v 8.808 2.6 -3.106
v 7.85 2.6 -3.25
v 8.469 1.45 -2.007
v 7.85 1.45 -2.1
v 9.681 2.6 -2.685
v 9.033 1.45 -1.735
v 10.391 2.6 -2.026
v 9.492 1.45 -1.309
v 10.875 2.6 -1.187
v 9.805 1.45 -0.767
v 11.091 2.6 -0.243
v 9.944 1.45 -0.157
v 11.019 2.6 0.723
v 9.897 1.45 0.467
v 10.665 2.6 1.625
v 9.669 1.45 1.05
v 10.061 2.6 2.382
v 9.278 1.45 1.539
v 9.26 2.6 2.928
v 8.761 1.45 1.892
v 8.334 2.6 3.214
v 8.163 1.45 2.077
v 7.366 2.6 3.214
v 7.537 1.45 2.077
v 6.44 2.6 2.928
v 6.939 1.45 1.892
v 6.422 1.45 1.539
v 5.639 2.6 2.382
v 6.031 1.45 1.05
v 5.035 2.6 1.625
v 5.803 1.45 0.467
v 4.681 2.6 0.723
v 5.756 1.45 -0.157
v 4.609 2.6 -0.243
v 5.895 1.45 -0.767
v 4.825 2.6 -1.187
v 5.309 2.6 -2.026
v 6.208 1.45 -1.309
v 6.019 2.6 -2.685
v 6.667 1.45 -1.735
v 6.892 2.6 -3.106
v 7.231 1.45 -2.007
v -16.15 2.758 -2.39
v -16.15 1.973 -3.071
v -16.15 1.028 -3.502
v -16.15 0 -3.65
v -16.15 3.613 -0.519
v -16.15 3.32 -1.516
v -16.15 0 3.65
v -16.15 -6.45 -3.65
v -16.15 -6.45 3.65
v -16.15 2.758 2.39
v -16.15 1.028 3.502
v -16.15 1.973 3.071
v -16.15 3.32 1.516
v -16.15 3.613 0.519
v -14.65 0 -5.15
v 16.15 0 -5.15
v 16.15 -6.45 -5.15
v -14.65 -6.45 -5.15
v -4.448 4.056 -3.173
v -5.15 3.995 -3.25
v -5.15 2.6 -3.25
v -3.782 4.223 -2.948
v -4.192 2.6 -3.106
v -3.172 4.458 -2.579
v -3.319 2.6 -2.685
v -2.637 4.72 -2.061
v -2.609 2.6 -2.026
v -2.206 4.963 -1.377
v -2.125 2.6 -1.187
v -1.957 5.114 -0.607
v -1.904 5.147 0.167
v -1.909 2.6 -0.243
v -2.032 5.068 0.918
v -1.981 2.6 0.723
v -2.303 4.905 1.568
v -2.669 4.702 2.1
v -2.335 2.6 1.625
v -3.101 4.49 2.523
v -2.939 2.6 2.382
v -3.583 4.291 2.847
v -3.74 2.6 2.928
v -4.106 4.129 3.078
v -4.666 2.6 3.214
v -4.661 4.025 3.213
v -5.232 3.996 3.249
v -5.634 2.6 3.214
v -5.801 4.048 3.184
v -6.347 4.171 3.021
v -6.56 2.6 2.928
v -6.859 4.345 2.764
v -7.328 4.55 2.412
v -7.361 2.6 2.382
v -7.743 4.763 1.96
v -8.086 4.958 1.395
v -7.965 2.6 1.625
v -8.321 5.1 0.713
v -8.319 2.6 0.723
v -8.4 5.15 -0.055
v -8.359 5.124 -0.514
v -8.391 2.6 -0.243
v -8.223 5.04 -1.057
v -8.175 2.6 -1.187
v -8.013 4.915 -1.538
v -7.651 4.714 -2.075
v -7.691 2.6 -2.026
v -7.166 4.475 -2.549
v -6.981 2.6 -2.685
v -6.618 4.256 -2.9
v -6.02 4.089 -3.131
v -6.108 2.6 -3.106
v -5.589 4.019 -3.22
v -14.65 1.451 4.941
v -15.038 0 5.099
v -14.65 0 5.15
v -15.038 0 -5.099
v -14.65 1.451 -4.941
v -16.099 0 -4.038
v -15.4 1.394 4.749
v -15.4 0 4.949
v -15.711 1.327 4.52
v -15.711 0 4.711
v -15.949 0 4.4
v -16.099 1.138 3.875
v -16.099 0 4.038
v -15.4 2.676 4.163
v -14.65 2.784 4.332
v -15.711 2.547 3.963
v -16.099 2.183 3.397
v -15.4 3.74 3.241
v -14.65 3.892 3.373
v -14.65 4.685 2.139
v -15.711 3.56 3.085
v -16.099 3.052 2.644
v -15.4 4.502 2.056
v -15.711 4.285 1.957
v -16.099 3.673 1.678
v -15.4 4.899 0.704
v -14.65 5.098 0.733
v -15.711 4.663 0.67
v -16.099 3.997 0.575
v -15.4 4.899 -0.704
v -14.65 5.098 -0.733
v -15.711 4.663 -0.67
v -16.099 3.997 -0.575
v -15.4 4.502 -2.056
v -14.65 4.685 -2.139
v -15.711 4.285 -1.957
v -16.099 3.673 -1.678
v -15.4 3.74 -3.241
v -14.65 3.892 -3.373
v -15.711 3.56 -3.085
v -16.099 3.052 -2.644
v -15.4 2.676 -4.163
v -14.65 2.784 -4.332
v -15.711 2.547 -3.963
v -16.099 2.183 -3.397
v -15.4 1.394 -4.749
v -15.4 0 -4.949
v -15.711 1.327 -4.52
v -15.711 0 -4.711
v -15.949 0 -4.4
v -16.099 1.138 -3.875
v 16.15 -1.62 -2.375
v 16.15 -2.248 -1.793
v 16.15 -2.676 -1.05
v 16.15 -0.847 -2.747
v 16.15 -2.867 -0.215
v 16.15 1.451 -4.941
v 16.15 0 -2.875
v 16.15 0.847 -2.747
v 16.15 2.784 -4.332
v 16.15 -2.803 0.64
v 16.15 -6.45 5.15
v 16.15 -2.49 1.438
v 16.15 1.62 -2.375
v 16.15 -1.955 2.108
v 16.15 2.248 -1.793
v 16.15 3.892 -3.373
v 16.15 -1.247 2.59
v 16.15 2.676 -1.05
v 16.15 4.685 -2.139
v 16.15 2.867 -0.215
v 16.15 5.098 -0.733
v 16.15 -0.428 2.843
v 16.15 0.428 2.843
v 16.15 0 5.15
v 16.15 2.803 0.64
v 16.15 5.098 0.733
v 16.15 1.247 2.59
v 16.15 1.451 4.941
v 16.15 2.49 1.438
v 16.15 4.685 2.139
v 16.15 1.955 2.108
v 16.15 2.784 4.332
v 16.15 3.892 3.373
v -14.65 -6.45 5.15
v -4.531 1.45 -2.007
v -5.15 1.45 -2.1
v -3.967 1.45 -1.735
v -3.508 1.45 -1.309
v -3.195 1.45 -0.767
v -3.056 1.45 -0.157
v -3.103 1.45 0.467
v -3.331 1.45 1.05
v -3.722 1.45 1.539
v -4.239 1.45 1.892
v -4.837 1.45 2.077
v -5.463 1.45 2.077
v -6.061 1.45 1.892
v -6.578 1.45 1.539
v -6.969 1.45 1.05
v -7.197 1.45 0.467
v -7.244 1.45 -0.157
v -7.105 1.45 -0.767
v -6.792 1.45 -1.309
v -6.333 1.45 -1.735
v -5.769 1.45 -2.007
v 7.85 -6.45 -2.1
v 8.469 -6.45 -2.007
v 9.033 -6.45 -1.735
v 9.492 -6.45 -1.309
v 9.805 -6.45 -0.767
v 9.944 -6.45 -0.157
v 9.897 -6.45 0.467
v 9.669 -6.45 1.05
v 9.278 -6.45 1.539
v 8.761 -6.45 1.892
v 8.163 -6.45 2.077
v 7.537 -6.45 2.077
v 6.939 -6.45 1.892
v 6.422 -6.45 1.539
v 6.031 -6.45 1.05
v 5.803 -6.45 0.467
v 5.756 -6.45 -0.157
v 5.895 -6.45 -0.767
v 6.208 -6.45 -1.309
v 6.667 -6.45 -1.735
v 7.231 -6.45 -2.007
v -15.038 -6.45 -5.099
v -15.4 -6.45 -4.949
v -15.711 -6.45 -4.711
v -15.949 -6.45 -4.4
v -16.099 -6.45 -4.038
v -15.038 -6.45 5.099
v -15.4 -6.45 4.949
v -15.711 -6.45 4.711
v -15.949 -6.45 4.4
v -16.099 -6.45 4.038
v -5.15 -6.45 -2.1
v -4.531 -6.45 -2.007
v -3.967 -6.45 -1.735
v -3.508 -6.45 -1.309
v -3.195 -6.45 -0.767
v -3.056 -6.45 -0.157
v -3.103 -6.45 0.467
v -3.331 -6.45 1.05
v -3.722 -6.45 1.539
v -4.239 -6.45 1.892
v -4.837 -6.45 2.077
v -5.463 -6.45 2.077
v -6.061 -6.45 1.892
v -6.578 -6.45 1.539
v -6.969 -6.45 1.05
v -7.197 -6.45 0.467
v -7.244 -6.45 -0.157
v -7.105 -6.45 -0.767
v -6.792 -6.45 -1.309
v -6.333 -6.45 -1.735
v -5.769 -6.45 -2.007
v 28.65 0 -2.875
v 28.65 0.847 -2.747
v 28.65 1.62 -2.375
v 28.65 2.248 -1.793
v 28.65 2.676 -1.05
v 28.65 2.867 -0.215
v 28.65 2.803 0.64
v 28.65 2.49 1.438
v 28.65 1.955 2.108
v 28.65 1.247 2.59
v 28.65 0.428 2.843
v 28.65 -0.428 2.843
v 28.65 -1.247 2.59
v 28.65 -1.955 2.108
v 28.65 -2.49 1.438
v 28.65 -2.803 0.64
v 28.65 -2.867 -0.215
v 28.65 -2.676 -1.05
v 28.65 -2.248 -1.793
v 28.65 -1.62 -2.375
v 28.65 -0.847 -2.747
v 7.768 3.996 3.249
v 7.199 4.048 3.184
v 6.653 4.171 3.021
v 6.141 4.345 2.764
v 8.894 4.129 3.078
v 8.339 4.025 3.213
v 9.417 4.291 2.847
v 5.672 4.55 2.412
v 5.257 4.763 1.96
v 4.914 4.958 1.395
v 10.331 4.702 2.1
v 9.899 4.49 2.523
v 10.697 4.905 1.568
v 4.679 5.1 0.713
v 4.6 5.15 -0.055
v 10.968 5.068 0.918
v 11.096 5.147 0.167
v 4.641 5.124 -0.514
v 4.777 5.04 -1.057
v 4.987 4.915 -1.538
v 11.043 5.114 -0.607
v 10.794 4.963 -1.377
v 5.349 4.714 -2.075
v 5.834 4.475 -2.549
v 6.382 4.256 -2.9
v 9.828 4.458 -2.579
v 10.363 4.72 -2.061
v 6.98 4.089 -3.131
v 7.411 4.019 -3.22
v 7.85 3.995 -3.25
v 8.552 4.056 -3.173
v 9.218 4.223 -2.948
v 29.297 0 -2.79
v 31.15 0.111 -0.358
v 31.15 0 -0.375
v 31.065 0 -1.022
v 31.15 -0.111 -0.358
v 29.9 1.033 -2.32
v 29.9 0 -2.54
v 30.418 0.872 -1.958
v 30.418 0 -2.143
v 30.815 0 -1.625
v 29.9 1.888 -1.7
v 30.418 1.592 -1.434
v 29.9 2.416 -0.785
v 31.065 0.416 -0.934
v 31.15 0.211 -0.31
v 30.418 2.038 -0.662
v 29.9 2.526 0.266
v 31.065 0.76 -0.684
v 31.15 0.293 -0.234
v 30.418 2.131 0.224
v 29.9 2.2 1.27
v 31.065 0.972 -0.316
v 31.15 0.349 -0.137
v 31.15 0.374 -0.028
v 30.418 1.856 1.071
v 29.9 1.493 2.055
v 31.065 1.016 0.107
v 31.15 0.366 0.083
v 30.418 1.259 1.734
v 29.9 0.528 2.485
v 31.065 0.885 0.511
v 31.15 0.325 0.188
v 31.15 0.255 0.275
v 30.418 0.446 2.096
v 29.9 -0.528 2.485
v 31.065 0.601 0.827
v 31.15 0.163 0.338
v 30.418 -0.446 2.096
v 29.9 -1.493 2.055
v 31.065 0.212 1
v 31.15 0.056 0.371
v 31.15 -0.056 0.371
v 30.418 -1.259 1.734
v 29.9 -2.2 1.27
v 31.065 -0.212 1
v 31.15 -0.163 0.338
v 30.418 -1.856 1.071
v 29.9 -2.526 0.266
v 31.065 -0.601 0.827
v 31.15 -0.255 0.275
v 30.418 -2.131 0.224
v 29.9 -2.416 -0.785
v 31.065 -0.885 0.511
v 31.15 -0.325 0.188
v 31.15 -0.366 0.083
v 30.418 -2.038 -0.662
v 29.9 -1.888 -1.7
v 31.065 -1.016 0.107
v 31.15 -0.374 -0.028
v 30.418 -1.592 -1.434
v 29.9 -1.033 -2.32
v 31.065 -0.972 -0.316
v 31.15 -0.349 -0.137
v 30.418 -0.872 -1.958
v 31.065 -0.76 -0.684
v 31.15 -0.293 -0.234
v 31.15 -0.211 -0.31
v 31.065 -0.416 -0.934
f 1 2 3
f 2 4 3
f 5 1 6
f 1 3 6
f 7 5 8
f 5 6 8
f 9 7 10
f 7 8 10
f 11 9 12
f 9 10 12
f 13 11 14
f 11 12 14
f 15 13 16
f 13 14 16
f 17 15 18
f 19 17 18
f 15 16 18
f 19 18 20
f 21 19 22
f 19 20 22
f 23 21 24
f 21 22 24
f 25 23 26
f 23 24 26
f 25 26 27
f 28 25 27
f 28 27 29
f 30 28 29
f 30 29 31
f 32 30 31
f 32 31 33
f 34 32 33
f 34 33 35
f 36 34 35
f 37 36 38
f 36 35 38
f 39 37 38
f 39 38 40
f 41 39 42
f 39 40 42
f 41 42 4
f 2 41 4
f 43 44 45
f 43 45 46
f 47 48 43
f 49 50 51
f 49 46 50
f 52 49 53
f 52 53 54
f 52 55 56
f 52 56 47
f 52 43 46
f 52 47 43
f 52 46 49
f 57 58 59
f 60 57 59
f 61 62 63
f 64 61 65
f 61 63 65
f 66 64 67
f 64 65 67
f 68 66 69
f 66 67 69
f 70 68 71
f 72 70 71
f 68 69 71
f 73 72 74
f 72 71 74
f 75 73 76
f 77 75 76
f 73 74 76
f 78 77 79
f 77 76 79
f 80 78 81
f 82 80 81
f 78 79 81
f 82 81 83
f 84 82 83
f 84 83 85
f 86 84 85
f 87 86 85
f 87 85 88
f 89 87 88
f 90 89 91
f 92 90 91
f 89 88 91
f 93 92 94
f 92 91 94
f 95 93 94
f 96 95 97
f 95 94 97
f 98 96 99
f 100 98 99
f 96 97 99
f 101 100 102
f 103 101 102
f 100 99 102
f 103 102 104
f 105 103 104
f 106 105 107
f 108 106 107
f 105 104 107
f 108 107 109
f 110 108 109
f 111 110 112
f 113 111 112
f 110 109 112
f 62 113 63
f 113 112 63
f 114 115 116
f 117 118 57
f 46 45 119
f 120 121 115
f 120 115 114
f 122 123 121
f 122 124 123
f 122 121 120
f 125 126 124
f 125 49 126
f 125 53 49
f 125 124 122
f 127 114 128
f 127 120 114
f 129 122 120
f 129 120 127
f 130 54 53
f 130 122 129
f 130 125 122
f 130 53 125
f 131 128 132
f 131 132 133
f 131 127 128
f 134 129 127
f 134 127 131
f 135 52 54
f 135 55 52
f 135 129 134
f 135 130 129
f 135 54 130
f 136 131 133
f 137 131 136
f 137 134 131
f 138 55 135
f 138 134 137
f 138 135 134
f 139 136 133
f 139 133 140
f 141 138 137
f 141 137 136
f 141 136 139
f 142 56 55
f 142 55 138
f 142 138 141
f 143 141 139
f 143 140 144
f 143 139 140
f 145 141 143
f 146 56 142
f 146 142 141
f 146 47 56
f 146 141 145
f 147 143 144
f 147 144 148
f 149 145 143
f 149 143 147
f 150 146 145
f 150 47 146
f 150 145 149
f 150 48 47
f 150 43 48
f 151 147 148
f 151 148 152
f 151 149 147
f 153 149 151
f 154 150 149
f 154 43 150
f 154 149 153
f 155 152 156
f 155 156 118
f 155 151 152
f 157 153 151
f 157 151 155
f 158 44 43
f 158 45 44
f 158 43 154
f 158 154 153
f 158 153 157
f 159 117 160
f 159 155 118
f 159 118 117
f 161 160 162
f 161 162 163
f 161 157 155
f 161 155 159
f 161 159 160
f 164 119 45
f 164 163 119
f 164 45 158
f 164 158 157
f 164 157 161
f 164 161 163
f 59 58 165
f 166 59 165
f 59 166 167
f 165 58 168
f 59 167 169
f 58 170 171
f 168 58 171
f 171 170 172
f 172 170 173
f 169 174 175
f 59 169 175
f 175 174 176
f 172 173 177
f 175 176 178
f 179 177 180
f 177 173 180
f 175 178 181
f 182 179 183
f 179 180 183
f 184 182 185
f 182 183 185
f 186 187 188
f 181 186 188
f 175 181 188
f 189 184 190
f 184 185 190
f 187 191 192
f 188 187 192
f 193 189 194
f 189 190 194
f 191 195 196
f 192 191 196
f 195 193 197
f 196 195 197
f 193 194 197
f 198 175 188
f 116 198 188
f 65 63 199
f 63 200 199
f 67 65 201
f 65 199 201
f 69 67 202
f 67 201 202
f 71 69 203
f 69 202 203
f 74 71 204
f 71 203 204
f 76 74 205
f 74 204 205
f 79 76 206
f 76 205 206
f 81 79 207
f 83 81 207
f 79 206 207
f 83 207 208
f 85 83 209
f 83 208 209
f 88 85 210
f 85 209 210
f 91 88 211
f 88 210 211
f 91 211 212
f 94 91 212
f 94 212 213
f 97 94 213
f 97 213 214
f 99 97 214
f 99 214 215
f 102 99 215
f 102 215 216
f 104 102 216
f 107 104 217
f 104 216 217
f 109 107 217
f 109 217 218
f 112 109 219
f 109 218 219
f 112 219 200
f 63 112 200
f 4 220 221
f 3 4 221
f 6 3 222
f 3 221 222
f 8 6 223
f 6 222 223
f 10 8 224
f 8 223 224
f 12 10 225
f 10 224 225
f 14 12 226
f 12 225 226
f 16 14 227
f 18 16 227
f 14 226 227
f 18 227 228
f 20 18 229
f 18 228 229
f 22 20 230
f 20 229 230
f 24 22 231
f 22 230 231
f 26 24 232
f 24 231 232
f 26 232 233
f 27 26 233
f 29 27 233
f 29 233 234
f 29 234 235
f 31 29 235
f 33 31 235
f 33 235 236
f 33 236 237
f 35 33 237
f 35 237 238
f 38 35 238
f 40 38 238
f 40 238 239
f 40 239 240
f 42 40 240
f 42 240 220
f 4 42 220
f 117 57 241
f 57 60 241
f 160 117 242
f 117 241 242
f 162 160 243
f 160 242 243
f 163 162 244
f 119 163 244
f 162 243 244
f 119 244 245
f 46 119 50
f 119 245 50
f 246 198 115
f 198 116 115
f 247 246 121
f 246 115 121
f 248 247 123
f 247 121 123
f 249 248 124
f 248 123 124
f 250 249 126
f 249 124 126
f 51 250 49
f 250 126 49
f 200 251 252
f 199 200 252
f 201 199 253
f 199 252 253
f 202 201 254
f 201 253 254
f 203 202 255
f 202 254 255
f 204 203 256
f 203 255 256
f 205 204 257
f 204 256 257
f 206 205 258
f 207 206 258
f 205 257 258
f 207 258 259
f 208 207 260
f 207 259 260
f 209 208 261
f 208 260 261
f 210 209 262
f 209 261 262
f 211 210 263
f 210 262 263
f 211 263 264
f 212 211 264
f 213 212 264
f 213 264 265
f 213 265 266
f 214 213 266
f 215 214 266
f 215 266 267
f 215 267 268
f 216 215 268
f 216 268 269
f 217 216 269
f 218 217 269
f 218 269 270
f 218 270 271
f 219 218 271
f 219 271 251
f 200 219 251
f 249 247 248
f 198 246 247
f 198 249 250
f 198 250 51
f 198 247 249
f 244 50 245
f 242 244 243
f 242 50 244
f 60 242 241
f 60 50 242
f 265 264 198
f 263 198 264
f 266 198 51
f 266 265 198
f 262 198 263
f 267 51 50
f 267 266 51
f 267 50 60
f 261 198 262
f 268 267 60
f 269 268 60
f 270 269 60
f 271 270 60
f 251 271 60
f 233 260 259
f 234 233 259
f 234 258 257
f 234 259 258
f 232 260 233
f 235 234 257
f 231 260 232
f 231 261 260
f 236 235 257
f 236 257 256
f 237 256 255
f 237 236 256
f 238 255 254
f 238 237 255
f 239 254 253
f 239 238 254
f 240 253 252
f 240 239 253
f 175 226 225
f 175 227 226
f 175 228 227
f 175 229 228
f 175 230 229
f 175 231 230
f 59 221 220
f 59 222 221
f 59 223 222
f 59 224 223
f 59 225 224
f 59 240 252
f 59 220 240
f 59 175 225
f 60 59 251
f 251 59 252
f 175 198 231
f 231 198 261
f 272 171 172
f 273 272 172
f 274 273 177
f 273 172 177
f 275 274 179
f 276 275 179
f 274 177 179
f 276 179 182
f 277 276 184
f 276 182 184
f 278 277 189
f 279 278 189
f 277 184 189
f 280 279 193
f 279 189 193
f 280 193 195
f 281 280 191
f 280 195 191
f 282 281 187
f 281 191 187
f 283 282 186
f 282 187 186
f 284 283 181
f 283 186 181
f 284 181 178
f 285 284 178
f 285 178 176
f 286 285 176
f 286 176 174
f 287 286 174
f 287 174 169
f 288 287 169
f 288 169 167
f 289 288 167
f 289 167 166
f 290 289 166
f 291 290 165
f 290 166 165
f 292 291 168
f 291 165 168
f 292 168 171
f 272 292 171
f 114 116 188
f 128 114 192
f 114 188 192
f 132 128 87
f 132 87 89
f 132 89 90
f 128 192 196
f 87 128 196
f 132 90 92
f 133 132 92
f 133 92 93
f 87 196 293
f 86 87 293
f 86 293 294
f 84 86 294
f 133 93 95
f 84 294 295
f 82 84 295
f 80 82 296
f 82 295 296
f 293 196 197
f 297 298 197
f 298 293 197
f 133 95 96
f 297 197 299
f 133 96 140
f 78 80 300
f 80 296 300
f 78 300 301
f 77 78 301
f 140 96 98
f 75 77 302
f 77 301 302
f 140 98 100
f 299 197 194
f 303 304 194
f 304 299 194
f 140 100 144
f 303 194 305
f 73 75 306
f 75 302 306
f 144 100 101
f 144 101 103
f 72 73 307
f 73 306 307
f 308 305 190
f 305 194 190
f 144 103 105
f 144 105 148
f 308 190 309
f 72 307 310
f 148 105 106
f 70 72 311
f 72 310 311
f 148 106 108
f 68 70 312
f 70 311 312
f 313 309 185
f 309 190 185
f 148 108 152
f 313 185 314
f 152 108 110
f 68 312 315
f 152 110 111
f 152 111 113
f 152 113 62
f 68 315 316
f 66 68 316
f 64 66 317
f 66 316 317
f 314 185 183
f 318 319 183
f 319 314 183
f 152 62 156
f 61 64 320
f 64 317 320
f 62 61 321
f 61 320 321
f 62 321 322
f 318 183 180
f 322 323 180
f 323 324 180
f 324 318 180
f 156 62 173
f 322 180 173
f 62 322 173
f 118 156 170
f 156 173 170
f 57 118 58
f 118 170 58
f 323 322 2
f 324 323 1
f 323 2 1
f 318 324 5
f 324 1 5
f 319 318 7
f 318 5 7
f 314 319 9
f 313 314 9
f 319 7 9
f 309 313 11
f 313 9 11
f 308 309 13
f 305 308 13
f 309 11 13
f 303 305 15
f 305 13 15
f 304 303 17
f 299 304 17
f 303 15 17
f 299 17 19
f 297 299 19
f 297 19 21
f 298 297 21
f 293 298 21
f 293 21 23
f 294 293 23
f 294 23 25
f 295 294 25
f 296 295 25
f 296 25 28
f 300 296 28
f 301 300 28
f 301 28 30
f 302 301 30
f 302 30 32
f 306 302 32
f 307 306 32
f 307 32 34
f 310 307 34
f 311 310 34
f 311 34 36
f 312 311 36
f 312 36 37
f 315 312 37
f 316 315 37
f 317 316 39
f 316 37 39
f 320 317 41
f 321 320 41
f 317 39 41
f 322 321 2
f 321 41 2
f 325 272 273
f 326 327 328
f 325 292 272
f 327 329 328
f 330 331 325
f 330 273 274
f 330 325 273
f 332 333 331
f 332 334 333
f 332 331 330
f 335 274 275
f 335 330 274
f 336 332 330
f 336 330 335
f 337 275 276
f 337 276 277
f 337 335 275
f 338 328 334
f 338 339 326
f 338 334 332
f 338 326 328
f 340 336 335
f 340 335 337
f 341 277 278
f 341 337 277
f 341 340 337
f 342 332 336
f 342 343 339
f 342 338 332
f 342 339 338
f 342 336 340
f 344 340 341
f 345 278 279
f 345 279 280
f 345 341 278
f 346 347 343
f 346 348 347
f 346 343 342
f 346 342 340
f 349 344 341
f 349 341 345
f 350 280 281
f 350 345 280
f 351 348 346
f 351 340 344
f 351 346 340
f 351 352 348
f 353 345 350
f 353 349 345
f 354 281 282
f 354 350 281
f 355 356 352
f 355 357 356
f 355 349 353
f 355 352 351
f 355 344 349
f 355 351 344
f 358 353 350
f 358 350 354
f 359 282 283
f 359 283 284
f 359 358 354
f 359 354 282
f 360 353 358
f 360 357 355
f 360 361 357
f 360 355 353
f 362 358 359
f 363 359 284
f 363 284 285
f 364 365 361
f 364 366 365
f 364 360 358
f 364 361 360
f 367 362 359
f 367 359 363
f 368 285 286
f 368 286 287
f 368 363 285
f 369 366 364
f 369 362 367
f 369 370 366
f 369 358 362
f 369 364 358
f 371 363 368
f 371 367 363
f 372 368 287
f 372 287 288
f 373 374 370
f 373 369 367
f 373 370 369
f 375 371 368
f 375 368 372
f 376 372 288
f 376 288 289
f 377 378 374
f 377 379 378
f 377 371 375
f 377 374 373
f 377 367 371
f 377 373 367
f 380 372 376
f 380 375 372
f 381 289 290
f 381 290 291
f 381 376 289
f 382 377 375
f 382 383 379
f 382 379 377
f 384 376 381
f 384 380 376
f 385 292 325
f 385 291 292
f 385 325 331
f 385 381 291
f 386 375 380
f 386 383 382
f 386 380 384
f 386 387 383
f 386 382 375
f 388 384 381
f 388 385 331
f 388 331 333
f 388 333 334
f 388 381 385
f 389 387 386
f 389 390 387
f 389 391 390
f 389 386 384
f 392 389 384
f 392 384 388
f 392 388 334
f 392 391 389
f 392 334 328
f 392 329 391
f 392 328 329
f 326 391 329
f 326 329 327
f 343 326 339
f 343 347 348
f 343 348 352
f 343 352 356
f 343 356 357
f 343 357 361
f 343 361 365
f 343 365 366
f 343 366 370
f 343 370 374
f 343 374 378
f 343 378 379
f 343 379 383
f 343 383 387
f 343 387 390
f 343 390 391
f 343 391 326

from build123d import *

# Parameters (mm, degrees)
ESBO_O1_R                = 2.95
RESSALTO_EXTRUS_O1_DEPTH = 16.15
RESSALTO_EXTRUS_O2_DEPTH = 32.3
FILETE1_R                = 1.5
ESBO_O3_R                = 3.25
CORTE_EXTRUS_O1_DEPTH    = 21.540435635
ESBO_O5_R                = 3.25
ESBO_O5_R_2              = 2.1
RESSALTO_EXTRUS_O3_DEPTH = 9.1
CHANFRO1_SIZE            = 1.2
ESBO_O7_R                = 2.875
RESSALTO_EXTRUS_O6_DEPTH = 15
FILETE2_R                = 2.5


with BuildPart() as part:
    # Esboço1 → Ressalto-extrusão1 (new, symmetric)
    with BuildSketch(Plane(origin=(0, 0, 0), x_dir=(0, 0, -1), z_dir=(1, 0, 0))):
        with BuildLine():
            Line((5.15, -6.450193796), (-5.15, -6.450193796))
            Line((-5.15, -6.450193796), (-5.15, 0))
            ThreePointArc((-5.15, 0), (0, 5.15), (5.15, 0))
            Line((5.15, 0), (5.15, -6.450193796))
        make_face()
        Circle(ESBO_O1_R, mode=Mode.SUBTRACT)
    extrude(amount=RESSALTO_EXTRUS_O1_DEPTH, both=True)

    # Esboço2 → Ressalto-extrusão2 (add, through all)
    with BuildSketch(Plane.ZY.offset(16.15)):
        with BuildLine():
            Line((-5.15, 0), (-5.15, -6.450193796))
            Line((-5.15, -6.450193796), (5.15, -6.450193796))
            Line((5.15, -6.450193796), (5.15, 0))
            ThreePointArc((5.15, 0), (0, 5.15), (-5.15, 0))
        make_face()
    extrude(amount=-RESSALTO_EXTRUS_O2_DEPTH)

    # Filete1
    filete1_edges = [part.edges().sort_by_distance(p)[0] for p in [
        (-16.15, -3.225096898, -5.15),
        (-16.15, -3.225096898, 5.15),
        (-16.15, 5.15, 0),
    ]]
    fillet(filete1_edges, radius=FILETE1_R)

    # Esboço3 → Corte-extrusão1 (cut, through all)
    with BuildSketch(Plane.XZ.offset(6.450193796)):
        with Locations(Location((-5.15, 0, 0), (0, 0, 270))):
            Circle(ESBO_O3_R)
        with Locations(Location((7.85, 0, 0), (0, 0, 270))):
            Circle(ESBO_O3_R)
    extrude(amount=-CORTE_EXTRUS_O1_DEPTH, mode=Mode.SUBTRACT)

    # Esboço5 → Ressalto-extrusão3 (add)
    # profile 1 of 2: a face of its own
    with BuildSketch(Plane.XZ.offset(6.450193796)):
        with Locations(Location((7.85, 0, 0), (0, 0, 270))):
            Circle(ESBO_O5_R)
        with Locations(Location((7.85, 0, 0), (0, 0, 270))):
            Circle(ESBO_O5_R_2, mode=Mode.SUBTRACT)
    # profile 2 of 2: a face of its own
    with BuildSketch(Plane.XZ.offset(6.450193796)):
        with Locations(Location((-5.15, 0, 0), (0, 0, 270))):
            Circle(ESBO_O5_R)
        with Locations(Location((-5.15, 0, 0), (0, 0, 270))):
            Circle(ESBO_O5_R_2, mode=Mode.SUBTRACT)
    extrude(amount=-RESSALTO_EXTRUS_O3_DEPTH)

    # Chanfro1
    # the kernel refuses this chamfer: 1.2 mm, written as the material it takes off along each edge
    with BuildSketch(Plane(origin=(-5.15, 2.649806204, 0), x_dir=(0, 0, -1), z_dir=(-1, 0, 0))) as chanfro1_piece_1_section:
        Polygon((2.1 + CHANFRO1_SIZE, 0), (2.1, CHANFRO1_SIZE), (2.1, 0), align=None)
    chanfro1_piece_1 = revolve(axis=Axis((-5.15, 2.649806204, 0), (0, -1, 0)), mode=Mode.PRIVATE)
    chanfro1_piece_1 = chanfro1_piece_1 & Plane(origin=(-5.15, 2.024165302, 0), x_dir=(0, 0, -1), z_dir=(0, -1, 0)) * Cylinder(3.25, 14, mode=Mode.PRIVATE)
    add(chanfro1_piece_1, mode=Mode.SUBTRACT)
    with BuildSketch(Plane(origin=(7.85, 2.649806204, 0), x_dir=(0, 0, -1), z_dir=(-1, 0, 0))) as chanfro1_piece_2_section:
        Polygon((2.1 + CHANFRO1_SIZE, 0), (2.1, CHANFRO1_SIZE), (2.1, 0), align=None)
    chanfro1_piece_2 = revolve(axis=Axis((7.85, 2.649806204, 0), (0, -1, 0)), mode=Mode.PRIVATE)
    chanfro1_piece_2 = chanfro1_piece_2 & Plane(origin=(7.85, 2.024165302, 0), x_dir=(0, 0, -1), z_dir=(0, -1, 0)) * Cylinder(3.25, 14, mode=Mode.PRIVATE)
    add(chanfro1_piece_2, mode=Mode.SUBTRACT)

    # Esboço7 → Ressalto-extrusão6 (add)
    with BuildSketch(Plane(origin=(16.15, 0, 0), x_dir=(0, 0, -1), z_dir=(1, 0, 0))):
        Circle(ESBO_O7_R)
    extrude(amount=RESSALTO_EXTRUS_O6_DEPTH)

    # Filete2
    filete2_edges = [part.edges().sort_by_distance(p)[0] for p in [
        (31.15, 0, 2.875),
    ]]
    fillet(filete2_edges, radius=FILETE2_R)


solid = part.part
